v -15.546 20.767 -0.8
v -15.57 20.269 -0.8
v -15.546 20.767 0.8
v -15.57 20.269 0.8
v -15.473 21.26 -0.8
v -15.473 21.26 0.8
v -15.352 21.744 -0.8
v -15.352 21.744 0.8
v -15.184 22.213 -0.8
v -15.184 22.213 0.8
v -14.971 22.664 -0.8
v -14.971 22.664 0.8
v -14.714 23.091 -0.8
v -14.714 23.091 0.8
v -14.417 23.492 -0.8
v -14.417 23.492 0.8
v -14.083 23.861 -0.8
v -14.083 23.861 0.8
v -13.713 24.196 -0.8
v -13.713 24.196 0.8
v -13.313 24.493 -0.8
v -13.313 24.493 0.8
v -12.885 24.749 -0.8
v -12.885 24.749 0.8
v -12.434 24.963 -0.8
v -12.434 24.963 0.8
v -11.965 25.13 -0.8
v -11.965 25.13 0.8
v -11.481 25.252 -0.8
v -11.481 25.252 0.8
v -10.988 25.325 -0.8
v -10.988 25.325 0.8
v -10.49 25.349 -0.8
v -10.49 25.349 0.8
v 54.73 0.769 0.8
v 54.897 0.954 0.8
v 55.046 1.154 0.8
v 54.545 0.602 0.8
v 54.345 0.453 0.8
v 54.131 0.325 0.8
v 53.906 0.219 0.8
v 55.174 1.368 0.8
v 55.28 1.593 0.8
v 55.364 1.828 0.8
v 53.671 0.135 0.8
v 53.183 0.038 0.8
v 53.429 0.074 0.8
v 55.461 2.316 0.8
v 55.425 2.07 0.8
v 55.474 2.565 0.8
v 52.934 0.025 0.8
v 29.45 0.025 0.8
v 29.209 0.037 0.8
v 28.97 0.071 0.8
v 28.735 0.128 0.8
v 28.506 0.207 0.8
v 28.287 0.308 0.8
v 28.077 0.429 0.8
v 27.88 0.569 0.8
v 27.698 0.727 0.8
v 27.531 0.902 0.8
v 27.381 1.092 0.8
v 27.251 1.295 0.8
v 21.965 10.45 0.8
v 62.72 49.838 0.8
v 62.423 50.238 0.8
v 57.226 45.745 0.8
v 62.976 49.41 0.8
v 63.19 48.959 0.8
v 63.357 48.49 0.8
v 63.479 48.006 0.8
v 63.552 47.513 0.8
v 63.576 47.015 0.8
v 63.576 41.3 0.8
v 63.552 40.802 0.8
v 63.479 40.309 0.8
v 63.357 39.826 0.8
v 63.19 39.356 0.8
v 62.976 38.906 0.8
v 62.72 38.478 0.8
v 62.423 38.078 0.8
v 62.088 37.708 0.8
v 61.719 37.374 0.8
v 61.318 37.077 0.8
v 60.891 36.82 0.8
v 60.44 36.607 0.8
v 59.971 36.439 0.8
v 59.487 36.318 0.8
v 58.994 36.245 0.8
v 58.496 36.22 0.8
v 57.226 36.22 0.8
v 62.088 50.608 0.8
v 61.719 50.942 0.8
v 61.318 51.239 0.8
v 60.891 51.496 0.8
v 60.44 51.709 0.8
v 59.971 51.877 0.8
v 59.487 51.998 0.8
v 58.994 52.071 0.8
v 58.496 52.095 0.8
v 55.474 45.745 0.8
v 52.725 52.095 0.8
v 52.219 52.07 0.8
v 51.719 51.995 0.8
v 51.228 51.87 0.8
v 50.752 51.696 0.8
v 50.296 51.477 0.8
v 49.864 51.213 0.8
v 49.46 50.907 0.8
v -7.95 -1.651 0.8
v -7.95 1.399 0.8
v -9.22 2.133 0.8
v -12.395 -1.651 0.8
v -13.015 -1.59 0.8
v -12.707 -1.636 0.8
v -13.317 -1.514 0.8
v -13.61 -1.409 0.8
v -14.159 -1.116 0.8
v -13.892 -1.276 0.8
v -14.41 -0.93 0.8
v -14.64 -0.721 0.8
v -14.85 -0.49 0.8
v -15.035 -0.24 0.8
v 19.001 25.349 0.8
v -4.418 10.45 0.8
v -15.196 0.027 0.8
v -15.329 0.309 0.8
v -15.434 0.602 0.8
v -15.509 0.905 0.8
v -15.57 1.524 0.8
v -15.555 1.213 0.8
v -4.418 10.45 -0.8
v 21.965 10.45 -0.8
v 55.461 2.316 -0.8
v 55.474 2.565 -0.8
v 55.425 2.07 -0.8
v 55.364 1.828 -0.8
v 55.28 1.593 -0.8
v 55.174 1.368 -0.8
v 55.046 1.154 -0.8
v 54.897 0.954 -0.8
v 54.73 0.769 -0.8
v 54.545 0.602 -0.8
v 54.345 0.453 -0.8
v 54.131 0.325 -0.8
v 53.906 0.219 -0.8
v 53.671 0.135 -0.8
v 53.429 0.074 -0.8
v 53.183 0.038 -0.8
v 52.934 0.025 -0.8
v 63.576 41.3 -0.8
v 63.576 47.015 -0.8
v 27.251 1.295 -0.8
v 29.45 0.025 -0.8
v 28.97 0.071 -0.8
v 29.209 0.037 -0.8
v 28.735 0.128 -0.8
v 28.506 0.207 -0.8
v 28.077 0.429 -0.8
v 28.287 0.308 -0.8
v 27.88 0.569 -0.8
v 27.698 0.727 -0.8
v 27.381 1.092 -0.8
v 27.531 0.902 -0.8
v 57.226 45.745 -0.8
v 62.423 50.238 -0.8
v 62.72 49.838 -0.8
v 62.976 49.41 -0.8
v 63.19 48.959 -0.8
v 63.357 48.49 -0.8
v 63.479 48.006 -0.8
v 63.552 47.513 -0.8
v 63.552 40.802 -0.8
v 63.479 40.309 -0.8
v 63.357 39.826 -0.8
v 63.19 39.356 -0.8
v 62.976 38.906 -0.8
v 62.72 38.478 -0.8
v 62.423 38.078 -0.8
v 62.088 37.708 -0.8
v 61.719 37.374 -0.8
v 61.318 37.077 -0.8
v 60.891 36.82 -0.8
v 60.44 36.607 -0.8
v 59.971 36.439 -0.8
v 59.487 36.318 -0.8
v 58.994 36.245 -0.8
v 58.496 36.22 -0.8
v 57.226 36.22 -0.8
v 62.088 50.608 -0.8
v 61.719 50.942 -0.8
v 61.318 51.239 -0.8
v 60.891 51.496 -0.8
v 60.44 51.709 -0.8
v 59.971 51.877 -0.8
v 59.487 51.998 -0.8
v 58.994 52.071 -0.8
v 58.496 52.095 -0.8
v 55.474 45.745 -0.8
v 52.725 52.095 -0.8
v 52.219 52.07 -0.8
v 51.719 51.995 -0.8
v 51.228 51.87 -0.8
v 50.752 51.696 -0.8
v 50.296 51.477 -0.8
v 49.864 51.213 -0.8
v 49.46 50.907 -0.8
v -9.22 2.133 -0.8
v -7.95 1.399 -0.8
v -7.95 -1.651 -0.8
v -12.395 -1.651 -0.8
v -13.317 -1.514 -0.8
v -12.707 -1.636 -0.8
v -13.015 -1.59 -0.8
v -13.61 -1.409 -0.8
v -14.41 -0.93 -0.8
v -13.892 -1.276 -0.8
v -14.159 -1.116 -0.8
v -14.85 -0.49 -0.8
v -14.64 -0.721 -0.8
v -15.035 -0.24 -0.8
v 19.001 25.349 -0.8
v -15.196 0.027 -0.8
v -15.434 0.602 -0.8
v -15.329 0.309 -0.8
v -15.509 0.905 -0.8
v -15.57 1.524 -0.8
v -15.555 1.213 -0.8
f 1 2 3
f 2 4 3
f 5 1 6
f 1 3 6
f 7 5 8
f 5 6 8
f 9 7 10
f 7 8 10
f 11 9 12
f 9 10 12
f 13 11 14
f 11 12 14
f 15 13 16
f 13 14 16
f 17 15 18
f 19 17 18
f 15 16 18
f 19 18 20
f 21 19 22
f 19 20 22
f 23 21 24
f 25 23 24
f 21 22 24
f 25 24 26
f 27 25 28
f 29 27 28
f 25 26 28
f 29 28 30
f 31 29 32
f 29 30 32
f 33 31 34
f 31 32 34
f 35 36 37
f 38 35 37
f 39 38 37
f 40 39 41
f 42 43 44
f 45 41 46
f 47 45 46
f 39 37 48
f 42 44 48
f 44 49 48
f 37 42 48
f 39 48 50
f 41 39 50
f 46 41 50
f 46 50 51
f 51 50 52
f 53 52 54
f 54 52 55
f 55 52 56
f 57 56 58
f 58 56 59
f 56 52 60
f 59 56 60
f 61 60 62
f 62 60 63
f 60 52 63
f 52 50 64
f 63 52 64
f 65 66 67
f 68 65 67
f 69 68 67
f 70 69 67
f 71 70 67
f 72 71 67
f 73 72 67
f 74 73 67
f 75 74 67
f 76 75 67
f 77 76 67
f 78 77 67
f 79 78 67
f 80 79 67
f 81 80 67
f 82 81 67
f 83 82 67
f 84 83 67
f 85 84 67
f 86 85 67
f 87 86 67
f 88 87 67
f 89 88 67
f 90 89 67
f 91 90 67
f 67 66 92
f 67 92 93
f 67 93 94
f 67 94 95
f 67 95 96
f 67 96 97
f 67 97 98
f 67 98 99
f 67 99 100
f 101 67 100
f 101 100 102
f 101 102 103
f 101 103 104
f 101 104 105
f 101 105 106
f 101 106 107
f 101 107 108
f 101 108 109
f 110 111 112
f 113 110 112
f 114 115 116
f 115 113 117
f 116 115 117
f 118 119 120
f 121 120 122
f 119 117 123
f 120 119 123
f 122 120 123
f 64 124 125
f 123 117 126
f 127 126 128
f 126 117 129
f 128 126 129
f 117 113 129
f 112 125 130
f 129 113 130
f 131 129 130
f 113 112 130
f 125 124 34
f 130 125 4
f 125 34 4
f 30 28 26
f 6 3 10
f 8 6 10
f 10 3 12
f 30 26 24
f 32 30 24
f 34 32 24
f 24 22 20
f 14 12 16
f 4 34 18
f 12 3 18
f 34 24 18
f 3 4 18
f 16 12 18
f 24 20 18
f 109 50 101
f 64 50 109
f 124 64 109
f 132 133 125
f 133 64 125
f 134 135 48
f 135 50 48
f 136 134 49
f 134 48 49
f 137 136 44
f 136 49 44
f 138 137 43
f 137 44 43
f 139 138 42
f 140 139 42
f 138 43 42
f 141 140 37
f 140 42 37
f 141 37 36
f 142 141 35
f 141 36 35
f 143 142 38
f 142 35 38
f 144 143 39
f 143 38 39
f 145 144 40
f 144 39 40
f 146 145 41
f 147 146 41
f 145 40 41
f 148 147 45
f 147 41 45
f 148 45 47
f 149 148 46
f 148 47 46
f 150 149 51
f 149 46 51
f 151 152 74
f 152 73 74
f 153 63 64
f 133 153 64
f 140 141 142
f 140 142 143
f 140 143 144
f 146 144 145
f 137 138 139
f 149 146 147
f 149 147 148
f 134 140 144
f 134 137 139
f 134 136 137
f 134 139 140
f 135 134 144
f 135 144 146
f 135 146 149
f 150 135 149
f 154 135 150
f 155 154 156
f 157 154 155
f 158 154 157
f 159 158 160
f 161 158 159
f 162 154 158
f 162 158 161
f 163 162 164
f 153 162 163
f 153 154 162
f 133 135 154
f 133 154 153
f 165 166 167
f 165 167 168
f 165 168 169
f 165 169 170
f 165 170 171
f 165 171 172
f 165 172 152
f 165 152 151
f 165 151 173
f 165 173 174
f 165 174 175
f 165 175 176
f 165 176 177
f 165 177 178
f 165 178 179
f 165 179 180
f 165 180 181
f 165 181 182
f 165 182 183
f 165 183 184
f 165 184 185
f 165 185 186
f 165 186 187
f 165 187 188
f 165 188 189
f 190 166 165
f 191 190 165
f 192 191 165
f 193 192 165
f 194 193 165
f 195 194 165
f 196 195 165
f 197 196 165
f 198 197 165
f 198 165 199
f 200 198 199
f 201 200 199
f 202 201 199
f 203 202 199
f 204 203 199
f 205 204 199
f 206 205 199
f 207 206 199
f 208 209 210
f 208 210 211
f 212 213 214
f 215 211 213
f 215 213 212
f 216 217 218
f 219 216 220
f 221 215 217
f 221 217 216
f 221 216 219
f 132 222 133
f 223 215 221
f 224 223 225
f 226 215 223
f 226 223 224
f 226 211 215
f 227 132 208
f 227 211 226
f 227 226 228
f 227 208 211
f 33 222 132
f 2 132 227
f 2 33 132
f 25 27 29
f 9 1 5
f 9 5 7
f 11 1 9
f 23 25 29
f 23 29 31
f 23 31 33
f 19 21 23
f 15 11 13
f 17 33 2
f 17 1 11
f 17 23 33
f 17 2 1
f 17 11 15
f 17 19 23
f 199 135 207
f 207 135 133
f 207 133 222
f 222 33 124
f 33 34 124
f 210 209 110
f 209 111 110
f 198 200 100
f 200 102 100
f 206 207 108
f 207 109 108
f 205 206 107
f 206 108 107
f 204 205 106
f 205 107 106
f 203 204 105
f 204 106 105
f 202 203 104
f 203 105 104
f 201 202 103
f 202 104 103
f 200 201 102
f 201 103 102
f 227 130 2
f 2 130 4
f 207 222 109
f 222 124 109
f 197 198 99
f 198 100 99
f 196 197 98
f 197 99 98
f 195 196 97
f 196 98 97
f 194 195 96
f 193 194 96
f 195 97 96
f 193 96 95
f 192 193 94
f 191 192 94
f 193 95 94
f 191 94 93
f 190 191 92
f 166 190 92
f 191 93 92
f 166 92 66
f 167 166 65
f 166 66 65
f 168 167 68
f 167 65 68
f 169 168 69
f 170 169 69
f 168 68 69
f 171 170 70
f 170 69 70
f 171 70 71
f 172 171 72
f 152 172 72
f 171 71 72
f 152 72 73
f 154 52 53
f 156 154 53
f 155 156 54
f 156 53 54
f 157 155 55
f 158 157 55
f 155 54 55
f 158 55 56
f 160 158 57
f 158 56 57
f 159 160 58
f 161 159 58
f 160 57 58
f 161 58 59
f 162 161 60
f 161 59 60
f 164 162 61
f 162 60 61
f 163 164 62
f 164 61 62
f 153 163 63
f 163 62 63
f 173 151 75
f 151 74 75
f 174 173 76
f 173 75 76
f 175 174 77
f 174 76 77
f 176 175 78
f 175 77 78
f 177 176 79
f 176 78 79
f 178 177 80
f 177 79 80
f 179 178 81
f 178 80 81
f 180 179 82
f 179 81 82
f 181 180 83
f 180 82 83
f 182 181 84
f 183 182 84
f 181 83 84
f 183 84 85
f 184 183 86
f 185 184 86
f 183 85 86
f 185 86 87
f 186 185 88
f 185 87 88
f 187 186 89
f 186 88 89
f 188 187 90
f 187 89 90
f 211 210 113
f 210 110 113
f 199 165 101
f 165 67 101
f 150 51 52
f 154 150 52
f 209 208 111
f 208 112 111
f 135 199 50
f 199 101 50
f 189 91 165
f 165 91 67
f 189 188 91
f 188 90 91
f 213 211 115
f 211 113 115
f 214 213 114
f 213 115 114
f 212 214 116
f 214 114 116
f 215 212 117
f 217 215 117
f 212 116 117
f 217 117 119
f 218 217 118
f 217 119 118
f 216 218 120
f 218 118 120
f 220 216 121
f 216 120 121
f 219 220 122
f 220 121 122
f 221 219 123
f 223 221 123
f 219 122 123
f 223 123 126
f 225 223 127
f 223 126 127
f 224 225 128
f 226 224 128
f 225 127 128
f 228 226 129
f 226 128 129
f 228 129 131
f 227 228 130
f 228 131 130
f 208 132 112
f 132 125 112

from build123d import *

# Parameters (mm, degrees)
BOSS_EXTRUDE1_DEPTH = 0.8001


with BuildPart() as part:
    # Sketch1 → Boss-Extrude1 (new body, symmetric)
    with BuildSketch(Plane.XY):
        with BuildLine():
            Line((27.250759249, 1.2954), (21.965453493, 10.449818102))
            Line((21.965453493, 10.449818102), (-4.418491784, 10.449818102))
            Line((-4.418491784, 10.449818102), (-9.22042678, 2.132622715))
            Line((-9.22042678, 2.132622715), (-7.95042678, 1.399387873))
            Line((-7.95042678, 1.399387873), (-7.95042678, -1.651))
            Line((-7.95042678, -1.651), (-12.39542678, -1.651))
            ThreePointArc((-12.39542678, -1.651), (-14.64049081, -0.72106403), (-15.57042678, 1.524))
            Line((-15.57042678, 1.524), (-15.57042678, 20.2692))
            ThreePointArc((-15.57042678, 20.2692), (-14.082529228, 23.861302448), (-10.49042678, 25.3492))
            Line((-10.49042678, 25.3492), (19.001320062, 25.3492))
            Line((19.001320062, 25.3492), (49.459807733, 50.906905771))
            ThreePointArc((49.459807733, 50.906905771), (50.987706462, 51.789038514), (52.72516879, 52.0954))
            Line((52.72516879, 52.0954), (58.4962, 52.0954))
            ThreePointArc((58.4962, 52.0954), (62.088302448, 50.607502448), (63.5762, 47.0154))
            Line((63.5762, 47.0154), (63.5762, 41.3004))
            ThreePointArc((63.5762, 41.3004), (62.088302448, 37.708297552), (58.4962, 36.2204))
            Line((58.4962, 36.2204), (57.2262, 36.2204))
            Line((57.2262, 36.2204), (57.2262, 45.7454))
            Line((57.2262, 45.7454), (55.4736, 45.7454))
            Line((55.4736, 45.7454), (55.4736, 2.5654))
            ThreePointArc((55.4736, 2.5654), (54.729651224, 0.769348776), (52.9336, 0.0254))
            Line((52.9336, 0.0254), (29.450463774, 0.0254))
            ThreePointArc((29.450463774, 0.0254), (28.180463774, 0.365695474), (27.250759249, 1.2954))
        make_face()
    extrude(amount=BOSS_EXTRUDE1_DEPTH, both=True)


solid = part.part
